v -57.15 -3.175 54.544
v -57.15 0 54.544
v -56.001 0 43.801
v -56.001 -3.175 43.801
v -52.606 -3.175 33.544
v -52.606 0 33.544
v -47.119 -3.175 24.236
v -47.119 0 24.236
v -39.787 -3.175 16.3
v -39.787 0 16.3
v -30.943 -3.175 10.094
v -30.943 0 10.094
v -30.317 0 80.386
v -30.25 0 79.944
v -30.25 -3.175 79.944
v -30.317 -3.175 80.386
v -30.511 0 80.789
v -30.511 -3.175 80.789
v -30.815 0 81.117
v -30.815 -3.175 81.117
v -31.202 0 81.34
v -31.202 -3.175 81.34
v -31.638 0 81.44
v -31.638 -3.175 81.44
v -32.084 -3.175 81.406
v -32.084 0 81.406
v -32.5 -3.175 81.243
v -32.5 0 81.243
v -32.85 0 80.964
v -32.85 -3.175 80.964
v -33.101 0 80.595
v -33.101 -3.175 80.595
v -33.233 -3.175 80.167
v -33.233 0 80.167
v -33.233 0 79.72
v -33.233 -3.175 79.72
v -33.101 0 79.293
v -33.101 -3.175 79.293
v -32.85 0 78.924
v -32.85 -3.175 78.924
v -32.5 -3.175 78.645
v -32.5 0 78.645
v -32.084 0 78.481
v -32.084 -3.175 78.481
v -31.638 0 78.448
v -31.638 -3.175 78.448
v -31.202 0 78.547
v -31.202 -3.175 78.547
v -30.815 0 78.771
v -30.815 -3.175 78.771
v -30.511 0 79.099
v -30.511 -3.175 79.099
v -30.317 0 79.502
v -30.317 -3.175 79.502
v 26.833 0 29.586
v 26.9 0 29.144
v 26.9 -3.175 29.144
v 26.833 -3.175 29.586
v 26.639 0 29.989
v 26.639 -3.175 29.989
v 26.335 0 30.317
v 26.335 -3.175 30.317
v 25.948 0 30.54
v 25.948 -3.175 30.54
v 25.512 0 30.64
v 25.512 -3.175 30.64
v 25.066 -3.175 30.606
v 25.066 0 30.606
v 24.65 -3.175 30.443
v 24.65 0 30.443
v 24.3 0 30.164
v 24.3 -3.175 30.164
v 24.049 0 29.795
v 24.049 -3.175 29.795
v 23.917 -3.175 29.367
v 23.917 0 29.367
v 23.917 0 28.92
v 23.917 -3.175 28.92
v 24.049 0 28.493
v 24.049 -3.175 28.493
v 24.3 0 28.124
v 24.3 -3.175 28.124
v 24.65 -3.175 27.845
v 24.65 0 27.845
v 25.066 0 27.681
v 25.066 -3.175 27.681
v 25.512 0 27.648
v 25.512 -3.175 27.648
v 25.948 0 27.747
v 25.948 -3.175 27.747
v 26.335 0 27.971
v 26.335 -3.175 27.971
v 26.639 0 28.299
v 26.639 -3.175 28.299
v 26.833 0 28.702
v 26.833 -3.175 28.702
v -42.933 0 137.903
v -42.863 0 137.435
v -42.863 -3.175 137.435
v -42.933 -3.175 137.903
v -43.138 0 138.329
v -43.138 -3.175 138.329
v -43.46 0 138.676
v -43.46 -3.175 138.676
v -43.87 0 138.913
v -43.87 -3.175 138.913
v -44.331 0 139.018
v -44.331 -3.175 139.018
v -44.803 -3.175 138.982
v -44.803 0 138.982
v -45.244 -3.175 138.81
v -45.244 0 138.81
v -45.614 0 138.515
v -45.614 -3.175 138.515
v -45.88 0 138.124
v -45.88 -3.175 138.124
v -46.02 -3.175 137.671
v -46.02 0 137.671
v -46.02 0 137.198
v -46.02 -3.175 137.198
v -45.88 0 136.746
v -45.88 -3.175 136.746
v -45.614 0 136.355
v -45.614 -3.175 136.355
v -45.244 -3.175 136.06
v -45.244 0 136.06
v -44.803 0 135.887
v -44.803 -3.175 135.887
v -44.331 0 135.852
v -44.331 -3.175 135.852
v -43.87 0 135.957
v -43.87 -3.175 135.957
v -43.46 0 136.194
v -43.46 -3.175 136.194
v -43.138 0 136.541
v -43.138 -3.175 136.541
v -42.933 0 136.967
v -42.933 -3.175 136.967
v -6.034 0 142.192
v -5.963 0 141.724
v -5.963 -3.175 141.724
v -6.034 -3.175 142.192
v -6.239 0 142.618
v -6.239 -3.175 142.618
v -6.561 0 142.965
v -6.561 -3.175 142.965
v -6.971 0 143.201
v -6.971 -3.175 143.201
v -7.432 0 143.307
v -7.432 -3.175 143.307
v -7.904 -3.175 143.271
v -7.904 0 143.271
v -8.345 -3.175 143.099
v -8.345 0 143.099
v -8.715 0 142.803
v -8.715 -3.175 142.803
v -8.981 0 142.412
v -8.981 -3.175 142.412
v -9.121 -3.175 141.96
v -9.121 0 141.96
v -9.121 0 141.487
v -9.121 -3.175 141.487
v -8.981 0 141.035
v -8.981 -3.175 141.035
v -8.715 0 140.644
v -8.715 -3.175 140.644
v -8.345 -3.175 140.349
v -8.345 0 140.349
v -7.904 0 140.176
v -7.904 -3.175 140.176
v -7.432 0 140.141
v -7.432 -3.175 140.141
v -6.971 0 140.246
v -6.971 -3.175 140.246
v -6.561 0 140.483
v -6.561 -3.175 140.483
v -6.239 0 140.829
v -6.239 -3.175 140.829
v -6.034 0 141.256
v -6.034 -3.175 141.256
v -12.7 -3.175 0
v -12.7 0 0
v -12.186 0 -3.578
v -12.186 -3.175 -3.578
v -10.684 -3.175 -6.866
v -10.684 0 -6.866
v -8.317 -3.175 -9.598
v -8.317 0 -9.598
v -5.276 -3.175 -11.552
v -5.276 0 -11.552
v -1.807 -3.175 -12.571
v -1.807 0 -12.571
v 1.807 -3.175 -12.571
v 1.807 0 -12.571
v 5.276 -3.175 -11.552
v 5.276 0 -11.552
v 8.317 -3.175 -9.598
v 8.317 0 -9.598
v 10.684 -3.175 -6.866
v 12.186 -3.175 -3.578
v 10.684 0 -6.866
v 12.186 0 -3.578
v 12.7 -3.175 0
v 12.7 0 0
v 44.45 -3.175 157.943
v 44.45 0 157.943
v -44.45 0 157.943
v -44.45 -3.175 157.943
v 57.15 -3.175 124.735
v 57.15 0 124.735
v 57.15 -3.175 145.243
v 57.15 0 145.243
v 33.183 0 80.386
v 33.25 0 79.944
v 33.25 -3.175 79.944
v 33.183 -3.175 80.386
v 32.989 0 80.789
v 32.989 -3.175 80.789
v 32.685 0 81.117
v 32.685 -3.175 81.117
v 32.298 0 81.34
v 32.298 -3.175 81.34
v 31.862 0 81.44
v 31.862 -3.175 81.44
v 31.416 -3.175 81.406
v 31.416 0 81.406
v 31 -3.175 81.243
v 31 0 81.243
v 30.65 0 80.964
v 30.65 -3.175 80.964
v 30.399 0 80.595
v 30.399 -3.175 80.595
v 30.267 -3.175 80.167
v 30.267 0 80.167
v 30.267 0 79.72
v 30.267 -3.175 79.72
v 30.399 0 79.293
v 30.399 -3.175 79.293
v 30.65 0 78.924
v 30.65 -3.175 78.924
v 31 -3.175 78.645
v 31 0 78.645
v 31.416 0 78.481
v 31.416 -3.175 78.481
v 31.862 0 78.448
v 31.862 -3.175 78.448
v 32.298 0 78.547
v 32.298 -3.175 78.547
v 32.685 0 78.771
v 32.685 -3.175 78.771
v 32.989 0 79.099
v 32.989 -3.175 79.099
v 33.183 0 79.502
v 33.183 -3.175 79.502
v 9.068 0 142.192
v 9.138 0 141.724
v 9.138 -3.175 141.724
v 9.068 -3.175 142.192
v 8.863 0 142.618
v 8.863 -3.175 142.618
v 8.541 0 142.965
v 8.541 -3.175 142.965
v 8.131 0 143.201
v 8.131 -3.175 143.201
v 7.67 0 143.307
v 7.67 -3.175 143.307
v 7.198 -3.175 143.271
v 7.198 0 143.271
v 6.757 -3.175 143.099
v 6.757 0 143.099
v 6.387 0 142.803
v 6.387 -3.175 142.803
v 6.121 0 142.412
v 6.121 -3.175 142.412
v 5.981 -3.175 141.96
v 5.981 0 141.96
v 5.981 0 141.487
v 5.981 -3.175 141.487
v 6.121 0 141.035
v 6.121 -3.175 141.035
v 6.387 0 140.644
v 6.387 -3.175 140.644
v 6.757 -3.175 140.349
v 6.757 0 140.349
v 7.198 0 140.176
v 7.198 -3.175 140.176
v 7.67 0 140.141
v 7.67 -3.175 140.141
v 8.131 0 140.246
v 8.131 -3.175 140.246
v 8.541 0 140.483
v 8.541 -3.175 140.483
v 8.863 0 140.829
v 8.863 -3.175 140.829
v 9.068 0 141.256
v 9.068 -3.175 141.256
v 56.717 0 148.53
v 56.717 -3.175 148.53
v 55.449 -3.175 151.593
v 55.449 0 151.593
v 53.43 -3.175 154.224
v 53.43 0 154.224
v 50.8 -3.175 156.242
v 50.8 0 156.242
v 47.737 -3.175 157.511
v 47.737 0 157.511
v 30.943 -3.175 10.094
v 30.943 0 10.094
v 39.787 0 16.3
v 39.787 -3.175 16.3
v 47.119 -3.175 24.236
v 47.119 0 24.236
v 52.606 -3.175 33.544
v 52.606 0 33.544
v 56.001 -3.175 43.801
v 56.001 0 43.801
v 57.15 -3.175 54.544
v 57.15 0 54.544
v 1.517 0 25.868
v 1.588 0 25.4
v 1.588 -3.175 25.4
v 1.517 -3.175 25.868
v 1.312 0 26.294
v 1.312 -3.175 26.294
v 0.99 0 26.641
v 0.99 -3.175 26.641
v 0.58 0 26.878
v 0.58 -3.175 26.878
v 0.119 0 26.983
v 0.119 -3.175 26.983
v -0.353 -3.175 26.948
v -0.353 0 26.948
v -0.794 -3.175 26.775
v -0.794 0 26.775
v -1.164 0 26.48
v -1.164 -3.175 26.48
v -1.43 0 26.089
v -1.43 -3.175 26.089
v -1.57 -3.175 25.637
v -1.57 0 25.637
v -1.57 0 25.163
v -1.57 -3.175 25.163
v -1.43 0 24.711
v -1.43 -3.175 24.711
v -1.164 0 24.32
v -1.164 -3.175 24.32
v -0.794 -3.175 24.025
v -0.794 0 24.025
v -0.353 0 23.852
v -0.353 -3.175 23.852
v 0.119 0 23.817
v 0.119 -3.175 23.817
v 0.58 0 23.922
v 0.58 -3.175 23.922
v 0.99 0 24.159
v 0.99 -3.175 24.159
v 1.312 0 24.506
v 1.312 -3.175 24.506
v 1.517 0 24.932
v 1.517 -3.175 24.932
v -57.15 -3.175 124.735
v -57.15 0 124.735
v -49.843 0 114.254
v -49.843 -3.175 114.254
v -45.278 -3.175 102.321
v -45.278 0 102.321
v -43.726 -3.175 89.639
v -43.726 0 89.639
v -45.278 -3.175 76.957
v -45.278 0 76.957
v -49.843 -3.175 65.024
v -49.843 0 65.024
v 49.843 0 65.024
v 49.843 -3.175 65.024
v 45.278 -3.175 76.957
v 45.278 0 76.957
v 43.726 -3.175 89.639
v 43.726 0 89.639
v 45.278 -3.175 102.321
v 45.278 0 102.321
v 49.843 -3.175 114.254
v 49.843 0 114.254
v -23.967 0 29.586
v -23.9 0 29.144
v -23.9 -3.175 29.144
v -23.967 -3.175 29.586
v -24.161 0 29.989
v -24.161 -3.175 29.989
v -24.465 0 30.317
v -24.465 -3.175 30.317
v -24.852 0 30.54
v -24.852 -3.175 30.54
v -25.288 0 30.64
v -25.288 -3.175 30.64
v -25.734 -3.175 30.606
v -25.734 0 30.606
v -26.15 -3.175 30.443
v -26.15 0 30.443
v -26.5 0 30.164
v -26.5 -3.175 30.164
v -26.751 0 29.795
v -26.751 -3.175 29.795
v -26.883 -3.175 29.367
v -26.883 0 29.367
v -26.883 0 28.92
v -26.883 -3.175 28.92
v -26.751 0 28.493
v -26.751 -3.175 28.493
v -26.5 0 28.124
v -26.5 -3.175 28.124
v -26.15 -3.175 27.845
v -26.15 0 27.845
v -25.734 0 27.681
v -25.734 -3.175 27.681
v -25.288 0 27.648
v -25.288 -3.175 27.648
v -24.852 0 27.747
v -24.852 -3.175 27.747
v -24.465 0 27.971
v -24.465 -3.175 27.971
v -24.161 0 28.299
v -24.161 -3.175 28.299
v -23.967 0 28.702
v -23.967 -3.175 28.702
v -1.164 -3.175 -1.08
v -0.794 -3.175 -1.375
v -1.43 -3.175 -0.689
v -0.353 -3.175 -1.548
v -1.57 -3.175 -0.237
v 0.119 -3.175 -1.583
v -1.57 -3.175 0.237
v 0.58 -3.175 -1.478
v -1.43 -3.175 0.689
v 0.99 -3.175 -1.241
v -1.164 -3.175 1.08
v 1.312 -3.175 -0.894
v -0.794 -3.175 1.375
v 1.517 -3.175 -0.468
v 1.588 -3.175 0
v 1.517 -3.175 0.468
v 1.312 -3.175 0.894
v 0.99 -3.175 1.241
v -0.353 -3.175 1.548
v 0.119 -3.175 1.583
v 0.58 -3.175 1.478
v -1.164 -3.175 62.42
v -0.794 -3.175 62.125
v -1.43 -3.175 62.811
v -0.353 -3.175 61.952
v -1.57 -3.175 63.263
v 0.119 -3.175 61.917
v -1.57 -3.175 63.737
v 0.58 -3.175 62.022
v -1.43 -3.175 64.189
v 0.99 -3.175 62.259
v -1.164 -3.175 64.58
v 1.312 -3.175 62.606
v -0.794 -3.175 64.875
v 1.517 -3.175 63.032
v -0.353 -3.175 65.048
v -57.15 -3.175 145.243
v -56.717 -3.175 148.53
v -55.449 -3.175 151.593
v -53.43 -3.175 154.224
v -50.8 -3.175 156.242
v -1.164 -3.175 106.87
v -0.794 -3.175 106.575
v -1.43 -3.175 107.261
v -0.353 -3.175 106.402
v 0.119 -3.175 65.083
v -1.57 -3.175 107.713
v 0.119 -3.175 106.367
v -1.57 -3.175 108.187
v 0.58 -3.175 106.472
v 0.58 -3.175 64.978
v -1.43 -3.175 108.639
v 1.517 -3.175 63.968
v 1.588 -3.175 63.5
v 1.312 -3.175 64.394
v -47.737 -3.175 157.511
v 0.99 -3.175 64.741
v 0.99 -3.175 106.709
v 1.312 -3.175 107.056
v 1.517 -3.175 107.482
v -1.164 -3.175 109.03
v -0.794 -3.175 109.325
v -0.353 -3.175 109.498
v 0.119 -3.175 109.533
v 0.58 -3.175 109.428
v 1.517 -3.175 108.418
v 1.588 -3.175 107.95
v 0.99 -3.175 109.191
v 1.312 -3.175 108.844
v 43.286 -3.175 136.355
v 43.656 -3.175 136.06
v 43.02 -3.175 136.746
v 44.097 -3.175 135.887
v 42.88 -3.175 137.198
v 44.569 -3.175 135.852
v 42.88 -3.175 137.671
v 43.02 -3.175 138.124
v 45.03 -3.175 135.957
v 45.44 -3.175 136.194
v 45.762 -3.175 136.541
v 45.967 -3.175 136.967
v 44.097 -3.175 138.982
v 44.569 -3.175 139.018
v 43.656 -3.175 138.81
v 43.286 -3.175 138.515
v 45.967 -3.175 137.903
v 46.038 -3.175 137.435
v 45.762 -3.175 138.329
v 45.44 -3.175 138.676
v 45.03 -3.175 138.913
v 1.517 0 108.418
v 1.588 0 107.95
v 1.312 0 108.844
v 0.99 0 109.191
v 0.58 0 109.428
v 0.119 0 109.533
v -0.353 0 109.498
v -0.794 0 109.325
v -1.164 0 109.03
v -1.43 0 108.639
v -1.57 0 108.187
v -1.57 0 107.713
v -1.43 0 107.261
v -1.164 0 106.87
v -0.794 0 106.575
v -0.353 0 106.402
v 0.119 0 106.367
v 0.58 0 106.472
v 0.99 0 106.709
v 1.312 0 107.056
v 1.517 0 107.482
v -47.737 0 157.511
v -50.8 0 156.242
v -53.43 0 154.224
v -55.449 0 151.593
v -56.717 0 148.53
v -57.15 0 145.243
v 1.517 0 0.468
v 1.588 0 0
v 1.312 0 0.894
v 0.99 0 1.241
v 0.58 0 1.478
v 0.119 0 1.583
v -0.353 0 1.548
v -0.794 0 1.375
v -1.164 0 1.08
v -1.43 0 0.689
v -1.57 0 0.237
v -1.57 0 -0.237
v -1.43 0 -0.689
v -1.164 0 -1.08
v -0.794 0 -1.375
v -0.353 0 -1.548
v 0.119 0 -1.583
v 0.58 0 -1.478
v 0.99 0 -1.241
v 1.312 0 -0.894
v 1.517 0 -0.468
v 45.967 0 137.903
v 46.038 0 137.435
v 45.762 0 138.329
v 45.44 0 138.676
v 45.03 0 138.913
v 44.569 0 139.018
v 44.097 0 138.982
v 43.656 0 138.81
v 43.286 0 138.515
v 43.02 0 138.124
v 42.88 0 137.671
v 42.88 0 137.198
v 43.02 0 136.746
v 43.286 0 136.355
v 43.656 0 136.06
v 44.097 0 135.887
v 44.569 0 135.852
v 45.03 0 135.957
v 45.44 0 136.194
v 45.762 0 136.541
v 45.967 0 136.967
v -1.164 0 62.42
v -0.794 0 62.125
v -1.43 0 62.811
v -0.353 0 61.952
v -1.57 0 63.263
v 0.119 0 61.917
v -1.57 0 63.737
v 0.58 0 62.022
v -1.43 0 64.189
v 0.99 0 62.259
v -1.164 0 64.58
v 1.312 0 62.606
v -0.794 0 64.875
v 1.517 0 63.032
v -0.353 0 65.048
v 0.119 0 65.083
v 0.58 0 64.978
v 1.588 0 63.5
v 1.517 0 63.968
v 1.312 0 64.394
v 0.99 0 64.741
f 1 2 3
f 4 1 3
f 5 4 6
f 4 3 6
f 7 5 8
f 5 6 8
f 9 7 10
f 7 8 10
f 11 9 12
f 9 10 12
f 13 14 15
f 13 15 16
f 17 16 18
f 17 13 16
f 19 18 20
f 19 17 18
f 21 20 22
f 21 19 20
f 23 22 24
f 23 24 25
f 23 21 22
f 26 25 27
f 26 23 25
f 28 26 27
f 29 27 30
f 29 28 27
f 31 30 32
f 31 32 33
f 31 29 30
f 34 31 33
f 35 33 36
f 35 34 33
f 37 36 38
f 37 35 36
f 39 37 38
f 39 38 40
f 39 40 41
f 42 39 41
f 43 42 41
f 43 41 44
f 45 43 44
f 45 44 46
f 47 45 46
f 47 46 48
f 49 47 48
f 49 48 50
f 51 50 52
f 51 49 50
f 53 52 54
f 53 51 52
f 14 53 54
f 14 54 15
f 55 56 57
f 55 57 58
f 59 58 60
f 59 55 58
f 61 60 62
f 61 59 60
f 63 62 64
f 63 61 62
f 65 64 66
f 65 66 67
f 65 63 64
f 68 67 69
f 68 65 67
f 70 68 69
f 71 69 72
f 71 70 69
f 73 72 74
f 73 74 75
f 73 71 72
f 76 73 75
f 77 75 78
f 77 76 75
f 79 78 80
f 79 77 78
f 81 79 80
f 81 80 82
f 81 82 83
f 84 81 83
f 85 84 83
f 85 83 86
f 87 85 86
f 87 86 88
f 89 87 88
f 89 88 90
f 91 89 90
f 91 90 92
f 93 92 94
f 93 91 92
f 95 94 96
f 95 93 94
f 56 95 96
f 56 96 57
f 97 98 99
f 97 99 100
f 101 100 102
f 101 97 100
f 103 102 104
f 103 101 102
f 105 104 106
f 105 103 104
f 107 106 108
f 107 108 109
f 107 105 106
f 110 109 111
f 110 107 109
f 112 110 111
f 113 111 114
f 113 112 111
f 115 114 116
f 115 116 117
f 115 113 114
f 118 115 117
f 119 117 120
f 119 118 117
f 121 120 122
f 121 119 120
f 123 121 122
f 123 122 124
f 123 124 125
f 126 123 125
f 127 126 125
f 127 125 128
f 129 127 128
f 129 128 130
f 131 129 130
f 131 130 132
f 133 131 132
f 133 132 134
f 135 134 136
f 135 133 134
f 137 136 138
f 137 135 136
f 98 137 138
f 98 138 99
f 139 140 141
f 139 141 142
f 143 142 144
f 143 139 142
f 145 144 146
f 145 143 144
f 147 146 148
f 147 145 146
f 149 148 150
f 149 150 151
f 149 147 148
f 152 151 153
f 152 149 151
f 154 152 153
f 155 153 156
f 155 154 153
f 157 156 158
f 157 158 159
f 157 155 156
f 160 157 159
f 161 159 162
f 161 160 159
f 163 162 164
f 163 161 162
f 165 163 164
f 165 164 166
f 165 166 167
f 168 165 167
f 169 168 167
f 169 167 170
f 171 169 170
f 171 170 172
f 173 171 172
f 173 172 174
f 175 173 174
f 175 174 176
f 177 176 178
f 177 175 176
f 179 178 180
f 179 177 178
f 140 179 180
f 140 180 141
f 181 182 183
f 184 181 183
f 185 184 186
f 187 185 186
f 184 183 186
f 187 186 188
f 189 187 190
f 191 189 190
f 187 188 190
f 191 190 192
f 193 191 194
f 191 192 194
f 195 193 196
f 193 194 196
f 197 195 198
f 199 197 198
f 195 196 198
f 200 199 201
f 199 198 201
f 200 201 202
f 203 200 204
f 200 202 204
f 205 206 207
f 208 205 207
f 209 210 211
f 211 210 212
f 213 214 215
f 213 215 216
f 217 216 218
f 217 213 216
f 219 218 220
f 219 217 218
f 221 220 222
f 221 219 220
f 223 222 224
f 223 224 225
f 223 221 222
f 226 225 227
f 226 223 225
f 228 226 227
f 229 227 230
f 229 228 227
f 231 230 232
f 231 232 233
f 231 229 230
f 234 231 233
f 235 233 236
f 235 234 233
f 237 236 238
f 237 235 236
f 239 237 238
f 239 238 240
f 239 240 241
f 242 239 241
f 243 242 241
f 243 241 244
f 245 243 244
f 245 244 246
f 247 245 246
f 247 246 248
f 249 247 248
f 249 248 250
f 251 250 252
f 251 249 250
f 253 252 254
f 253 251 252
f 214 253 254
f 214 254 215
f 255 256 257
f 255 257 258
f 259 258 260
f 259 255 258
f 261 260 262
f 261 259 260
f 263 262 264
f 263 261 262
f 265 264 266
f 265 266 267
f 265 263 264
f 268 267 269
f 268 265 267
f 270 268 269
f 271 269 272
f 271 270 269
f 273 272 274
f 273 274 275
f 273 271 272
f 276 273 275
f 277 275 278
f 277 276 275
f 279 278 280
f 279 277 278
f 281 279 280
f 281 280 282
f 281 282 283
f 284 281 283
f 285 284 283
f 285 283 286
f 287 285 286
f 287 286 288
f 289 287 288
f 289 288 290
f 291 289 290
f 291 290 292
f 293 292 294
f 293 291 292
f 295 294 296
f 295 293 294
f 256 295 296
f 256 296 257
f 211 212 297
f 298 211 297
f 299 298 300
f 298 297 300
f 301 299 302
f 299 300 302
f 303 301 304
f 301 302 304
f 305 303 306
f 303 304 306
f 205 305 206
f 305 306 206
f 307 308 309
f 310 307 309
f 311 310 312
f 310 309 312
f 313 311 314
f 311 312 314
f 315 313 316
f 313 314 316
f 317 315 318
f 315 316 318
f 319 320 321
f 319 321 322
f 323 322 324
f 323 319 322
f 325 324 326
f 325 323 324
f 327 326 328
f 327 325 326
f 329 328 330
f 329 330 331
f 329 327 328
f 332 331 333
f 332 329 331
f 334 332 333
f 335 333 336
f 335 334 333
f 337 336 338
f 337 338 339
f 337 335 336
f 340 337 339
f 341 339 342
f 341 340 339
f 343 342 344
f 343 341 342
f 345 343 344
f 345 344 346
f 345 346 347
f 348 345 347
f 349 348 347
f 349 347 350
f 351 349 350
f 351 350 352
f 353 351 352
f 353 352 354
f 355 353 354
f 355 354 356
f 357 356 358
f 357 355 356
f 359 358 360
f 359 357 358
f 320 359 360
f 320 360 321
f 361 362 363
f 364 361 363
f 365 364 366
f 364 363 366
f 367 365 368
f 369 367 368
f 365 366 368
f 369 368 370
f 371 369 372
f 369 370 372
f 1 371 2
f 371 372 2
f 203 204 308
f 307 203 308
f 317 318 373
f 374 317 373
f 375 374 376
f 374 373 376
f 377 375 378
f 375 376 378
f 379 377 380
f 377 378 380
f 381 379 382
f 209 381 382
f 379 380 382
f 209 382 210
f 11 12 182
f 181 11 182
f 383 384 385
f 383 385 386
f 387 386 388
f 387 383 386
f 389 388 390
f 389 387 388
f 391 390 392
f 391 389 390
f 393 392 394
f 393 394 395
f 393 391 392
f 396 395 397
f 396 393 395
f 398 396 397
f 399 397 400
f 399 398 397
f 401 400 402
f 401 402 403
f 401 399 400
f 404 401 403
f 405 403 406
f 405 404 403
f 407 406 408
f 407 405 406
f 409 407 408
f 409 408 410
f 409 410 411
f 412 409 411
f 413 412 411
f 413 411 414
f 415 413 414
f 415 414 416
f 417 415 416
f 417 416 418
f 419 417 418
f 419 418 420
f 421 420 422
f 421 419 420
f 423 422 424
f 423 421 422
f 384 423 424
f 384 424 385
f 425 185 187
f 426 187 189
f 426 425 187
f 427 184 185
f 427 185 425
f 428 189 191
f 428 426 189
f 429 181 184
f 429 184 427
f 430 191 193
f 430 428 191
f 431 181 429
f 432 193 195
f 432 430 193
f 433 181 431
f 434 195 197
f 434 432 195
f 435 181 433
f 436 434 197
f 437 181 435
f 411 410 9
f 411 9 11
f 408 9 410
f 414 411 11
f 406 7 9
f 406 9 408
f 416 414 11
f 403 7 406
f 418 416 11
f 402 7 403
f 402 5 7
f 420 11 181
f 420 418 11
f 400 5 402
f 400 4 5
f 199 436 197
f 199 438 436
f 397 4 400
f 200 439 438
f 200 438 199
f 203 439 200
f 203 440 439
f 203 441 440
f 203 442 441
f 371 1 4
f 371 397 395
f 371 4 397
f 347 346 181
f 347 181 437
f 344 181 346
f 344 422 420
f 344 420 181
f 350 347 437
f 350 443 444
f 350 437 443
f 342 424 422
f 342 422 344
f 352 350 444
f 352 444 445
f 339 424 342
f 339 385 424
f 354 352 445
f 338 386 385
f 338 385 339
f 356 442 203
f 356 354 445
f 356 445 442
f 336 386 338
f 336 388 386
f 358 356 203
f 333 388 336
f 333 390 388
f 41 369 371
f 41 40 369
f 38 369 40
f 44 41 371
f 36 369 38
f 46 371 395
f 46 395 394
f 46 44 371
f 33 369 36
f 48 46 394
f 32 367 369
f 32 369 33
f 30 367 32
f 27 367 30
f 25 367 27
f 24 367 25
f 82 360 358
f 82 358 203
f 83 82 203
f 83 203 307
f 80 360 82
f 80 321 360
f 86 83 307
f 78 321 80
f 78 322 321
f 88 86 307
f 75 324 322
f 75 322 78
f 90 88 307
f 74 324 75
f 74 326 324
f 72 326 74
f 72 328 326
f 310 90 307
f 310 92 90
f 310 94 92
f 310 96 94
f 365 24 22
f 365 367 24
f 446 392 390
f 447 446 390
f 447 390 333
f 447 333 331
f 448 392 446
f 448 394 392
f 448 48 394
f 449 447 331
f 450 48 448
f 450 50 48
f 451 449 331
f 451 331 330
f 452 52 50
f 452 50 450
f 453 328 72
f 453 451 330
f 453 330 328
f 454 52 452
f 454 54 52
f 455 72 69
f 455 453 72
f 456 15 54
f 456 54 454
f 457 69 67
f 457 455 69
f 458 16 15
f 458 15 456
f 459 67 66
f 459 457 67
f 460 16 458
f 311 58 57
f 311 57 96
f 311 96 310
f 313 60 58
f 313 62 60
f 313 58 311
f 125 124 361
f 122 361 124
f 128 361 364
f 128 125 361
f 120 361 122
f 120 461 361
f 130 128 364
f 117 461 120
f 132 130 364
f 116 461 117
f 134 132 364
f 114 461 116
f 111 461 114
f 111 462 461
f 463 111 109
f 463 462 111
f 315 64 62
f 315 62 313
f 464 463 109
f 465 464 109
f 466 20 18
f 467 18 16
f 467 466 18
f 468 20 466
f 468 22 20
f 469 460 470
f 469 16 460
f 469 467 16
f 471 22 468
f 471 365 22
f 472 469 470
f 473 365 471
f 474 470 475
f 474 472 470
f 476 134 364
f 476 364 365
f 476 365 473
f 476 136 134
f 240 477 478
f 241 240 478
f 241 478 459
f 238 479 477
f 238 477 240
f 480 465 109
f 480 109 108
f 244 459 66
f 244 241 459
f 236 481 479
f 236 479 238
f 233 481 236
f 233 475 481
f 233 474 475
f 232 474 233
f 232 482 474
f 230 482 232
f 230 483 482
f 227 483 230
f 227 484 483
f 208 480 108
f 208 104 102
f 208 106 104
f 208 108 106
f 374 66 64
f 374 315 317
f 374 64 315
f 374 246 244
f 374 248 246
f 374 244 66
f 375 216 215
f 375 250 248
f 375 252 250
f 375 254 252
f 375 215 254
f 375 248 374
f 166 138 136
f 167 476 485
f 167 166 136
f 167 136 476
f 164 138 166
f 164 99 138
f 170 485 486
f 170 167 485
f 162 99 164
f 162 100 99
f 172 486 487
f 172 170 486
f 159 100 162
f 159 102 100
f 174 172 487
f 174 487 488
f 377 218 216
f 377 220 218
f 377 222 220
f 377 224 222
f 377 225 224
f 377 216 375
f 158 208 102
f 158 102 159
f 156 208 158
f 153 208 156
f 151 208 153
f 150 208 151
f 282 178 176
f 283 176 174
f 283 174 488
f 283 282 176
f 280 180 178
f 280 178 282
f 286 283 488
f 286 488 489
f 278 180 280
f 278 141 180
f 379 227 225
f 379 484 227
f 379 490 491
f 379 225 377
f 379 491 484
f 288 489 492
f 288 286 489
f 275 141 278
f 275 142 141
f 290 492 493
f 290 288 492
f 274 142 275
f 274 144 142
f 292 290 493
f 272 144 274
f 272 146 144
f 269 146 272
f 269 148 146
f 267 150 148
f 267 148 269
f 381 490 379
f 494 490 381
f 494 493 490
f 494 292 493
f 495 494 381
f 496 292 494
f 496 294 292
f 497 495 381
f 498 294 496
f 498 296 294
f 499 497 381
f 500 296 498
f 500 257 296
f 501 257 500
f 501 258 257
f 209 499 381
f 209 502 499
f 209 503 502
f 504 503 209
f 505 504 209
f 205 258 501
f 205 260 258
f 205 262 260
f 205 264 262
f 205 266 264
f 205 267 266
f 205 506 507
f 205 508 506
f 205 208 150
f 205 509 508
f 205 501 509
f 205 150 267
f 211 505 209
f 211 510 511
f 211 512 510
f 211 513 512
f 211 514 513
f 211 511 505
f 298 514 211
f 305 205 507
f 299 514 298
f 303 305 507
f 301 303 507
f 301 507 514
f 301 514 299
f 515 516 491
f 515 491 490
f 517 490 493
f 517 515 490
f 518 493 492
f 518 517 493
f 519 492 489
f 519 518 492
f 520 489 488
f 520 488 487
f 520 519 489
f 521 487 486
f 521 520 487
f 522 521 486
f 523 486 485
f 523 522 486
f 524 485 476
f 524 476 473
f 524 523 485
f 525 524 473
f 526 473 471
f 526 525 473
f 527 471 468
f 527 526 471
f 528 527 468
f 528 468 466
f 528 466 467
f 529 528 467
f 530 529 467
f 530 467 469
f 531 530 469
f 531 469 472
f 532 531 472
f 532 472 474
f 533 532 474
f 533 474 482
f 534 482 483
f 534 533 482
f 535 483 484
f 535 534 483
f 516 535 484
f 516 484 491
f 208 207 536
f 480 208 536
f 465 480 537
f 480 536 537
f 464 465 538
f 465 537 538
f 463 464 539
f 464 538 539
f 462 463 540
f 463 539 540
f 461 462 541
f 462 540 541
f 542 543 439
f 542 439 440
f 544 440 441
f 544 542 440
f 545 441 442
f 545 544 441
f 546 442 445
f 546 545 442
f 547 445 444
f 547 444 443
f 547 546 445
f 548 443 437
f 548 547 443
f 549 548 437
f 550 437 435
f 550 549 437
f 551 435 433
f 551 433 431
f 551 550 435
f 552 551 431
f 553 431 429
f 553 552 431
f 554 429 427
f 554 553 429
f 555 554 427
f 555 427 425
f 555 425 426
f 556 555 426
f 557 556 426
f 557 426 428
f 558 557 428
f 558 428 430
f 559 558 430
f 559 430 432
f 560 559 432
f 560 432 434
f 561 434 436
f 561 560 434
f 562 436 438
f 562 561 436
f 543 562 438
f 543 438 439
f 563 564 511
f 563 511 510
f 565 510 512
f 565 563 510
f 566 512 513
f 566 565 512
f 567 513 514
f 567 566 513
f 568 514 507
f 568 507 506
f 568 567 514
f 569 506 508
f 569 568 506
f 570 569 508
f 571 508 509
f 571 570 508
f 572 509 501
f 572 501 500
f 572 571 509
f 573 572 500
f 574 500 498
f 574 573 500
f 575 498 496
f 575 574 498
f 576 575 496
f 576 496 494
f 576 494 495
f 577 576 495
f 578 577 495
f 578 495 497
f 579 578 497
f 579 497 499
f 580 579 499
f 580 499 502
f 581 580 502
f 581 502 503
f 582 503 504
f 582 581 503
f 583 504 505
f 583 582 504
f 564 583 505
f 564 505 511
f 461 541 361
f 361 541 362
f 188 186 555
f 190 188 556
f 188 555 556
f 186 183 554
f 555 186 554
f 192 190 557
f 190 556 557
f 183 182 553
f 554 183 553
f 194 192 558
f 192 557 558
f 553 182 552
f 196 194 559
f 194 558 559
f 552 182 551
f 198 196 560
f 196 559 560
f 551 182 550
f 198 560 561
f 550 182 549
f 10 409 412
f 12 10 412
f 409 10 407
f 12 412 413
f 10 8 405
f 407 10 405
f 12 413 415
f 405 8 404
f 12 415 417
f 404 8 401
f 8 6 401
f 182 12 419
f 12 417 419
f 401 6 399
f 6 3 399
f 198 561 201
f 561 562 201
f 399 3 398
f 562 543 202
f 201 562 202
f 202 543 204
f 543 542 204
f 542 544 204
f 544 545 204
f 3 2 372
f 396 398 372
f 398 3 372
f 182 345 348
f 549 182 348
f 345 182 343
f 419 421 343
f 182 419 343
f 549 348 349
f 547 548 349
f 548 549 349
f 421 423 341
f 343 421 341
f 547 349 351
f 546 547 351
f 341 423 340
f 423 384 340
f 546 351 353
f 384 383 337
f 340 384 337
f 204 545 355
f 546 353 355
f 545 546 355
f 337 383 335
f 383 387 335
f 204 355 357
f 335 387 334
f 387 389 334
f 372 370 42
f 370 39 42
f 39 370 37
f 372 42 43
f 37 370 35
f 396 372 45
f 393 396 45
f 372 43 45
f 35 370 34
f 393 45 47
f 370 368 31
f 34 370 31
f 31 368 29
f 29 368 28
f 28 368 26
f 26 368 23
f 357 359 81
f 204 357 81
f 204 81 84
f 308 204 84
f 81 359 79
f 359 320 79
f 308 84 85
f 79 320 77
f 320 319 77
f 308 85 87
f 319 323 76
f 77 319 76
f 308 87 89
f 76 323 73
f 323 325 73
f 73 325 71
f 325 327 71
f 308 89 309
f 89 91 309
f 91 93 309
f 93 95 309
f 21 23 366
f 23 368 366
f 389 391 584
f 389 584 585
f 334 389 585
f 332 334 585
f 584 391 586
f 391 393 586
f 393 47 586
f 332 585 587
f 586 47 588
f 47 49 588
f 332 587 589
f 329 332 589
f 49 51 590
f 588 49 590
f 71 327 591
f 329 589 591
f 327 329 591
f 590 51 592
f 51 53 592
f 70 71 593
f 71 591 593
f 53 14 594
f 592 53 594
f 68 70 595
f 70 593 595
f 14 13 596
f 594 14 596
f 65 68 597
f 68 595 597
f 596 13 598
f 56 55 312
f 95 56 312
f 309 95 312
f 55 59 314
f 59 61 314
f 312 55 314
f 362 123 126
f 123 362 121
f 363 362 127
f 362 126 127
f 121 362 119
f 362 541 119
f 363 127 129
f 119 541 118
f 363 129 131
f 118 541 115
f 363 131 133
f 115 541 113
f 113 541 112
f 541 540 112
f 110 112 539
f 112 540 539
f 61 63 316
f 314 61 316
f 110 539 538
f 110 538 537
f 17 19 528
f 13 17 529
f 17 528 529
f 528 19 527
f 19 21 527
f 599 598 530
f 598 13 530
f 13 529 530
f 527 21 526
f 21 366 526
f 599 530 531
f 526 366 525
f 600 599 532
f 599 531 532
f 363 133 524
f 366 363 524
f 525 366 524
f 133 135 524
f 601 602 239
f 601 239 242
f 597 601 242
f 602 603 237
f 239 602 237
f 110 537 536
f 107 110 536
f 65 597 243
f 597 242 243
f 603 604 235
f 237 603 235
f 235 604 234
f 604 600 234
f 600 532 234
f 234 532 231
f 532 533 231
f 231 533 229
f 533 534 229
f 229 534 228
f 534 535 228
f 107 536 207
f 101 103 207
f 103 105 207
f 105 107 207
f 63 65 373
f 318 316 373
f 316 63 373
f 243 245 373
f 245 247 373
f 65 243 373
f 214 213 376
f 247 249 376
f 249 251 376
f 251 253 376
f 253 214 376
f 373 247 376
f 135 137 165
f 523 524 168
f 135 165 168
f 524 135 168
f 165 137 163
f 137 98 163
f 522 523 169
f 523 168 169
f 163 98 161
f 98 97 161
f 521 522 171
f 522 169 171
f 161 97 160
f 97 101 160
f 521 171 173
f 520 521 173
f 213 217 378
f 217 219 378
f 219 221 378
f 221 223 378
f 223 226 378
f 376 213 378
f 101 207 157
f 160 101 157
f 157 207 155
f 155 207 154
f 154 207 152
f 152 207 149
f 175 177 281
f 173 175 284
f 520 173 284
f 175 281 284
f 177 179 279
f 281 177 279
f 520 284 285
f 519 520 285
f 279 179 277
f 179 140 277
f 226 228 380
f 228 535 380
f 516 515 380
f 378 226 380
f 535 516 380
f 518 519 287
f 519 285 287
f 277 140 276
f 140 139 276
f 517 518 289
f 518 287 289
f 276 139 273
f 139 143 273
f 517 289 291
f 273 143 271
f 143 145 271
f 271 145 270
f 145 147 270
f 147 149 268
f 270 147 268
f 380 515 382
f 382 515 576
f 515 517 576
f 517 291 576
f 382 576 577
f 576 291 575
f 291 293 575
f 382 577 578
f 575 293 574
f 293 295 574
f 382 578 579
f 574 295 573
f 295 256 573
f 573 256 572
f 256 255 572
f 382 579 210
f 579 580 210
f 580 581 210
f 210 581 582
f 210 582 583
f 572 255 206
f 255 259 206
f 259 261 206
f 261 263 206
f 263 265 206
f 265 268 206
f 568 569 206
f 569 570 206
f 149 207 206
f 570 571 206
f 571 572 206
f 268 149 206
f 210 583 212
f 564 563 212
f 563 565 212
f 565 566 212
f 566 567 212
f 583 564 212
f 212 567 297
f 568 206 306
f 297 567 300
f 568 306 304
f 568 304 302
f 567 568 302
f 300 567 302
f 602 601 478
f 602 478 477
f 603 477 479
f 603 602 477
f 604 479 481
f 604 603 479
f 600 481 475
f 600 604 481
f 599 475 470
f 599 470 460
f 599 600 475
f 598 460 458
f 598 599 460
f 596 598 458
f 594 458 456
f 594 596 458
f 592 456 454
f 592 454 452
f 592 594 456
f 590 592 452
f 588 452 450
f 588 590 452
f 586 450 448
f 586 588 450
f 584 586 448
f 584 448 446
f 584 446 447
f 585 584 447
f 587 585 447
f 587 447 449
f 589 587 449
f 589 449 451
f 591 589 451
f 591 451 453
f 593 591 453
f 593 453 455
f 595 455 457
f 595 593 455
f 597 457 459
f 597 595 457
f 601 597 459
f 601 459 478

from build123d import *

# Parameters (mm, degrees)
F0_R     = 1.5875
F0_R_2   = 1.5
F1_DEPTH = 3.175


with BuildPart() as f1:
    # F0 (on Front) → F1 (new body)
    with BuildSketch(Plane.XZ):
        with BuildLine():
            ThreePointArc((-12.7, 0), (0, -12.7), (12.7, 0))
            ThreePointArc((12.7, 0), (0, 12.7), (-12.7, 0))
        make_face()
        Circle(F0_R, mode=Mode.SUBTRACT)
        with BuildLine():
            ThreePointArc((-12.7, 0), (0, 12.7), (12.7, 0))
            Line((12.7, 0), (30.943444, 10.093794))
            ThreePointArc((30.943444, 10.093794), (50.110639, 28.743667), (57.15, 54.543794))
            ThreePointArc((57.15, 54.543794), (43.726088, 89.639294), (57.15, 124.734794))
            Line((57.15, 124.734794), (57.15, 145.243444))
            ThreePointArc((57.15, 145.243444), (53.430256, 154.2237), (44.45, 157.943444))
            Line((44.45, 157.943444), (-44.45, 157.943444))
            ThreePointArc((-44.45, 157.943444), (-53.430256, 154.2237), (-57.15, 145.243444))
            Line((-57.15, 145.243444), (-57.15, 124.734794))
            ThreePointArc((-57.15, 124.734794), (-43.726088, 89.639294), (-57.15, 54.543794))
            ThreePointArc((-57.15, 54.543794), (-50.110639, 28.743667), (-30.943444, 10.093794))
            Line((-30.943444, 10.093794), (-12.7, 0))
        make_face()
        with Locations((-25.4, 29.143794)):
            Circle(F0_R_2, mode=Mode.SUBTRACT)
        with Locations((0, 25.4)):
            Circle(F0_R, mode=Mode.SUBTRACT)
        with Locations((25.4, 29.143794)):
            Circle(F0_R_2, mode=Mode.SUBTRACT)
        with Locations((0, 63.5)):
            Circle(F0_R, mode=Mode.SUBTRACT)
        with Locations((-31.75, 79.943794)):
            Circle(F0_R_2, mode=Mode.SUBTRACT)
        with Locations((-44.45, 137.434794)):
            Circle(F0_R, mode=Mode.SUBTRACT)
        with Locations((-7.550921, 141.723698)):
            Circle(F0_R, mode=Mode.SUBTRACT)
        with Locations((0, 107.95)):
            Circle(F0_R, mode=Mode.SUBTRACT)
        with Locations((31.75, 79.943794)):
            Circle(F0_R_2, mode=Mode.SUBTRACT)
        with Locations((7.550921, 141.723698)):
            Circle(F0_R, mode=Mode.SUBTRACT)
        with Locations((44.45, 137.434794)):
            Circle(F0_R, mode=Mode.SUBTRACT)
    extrude(amount=F1_DEPTH)


solid = f1.part
